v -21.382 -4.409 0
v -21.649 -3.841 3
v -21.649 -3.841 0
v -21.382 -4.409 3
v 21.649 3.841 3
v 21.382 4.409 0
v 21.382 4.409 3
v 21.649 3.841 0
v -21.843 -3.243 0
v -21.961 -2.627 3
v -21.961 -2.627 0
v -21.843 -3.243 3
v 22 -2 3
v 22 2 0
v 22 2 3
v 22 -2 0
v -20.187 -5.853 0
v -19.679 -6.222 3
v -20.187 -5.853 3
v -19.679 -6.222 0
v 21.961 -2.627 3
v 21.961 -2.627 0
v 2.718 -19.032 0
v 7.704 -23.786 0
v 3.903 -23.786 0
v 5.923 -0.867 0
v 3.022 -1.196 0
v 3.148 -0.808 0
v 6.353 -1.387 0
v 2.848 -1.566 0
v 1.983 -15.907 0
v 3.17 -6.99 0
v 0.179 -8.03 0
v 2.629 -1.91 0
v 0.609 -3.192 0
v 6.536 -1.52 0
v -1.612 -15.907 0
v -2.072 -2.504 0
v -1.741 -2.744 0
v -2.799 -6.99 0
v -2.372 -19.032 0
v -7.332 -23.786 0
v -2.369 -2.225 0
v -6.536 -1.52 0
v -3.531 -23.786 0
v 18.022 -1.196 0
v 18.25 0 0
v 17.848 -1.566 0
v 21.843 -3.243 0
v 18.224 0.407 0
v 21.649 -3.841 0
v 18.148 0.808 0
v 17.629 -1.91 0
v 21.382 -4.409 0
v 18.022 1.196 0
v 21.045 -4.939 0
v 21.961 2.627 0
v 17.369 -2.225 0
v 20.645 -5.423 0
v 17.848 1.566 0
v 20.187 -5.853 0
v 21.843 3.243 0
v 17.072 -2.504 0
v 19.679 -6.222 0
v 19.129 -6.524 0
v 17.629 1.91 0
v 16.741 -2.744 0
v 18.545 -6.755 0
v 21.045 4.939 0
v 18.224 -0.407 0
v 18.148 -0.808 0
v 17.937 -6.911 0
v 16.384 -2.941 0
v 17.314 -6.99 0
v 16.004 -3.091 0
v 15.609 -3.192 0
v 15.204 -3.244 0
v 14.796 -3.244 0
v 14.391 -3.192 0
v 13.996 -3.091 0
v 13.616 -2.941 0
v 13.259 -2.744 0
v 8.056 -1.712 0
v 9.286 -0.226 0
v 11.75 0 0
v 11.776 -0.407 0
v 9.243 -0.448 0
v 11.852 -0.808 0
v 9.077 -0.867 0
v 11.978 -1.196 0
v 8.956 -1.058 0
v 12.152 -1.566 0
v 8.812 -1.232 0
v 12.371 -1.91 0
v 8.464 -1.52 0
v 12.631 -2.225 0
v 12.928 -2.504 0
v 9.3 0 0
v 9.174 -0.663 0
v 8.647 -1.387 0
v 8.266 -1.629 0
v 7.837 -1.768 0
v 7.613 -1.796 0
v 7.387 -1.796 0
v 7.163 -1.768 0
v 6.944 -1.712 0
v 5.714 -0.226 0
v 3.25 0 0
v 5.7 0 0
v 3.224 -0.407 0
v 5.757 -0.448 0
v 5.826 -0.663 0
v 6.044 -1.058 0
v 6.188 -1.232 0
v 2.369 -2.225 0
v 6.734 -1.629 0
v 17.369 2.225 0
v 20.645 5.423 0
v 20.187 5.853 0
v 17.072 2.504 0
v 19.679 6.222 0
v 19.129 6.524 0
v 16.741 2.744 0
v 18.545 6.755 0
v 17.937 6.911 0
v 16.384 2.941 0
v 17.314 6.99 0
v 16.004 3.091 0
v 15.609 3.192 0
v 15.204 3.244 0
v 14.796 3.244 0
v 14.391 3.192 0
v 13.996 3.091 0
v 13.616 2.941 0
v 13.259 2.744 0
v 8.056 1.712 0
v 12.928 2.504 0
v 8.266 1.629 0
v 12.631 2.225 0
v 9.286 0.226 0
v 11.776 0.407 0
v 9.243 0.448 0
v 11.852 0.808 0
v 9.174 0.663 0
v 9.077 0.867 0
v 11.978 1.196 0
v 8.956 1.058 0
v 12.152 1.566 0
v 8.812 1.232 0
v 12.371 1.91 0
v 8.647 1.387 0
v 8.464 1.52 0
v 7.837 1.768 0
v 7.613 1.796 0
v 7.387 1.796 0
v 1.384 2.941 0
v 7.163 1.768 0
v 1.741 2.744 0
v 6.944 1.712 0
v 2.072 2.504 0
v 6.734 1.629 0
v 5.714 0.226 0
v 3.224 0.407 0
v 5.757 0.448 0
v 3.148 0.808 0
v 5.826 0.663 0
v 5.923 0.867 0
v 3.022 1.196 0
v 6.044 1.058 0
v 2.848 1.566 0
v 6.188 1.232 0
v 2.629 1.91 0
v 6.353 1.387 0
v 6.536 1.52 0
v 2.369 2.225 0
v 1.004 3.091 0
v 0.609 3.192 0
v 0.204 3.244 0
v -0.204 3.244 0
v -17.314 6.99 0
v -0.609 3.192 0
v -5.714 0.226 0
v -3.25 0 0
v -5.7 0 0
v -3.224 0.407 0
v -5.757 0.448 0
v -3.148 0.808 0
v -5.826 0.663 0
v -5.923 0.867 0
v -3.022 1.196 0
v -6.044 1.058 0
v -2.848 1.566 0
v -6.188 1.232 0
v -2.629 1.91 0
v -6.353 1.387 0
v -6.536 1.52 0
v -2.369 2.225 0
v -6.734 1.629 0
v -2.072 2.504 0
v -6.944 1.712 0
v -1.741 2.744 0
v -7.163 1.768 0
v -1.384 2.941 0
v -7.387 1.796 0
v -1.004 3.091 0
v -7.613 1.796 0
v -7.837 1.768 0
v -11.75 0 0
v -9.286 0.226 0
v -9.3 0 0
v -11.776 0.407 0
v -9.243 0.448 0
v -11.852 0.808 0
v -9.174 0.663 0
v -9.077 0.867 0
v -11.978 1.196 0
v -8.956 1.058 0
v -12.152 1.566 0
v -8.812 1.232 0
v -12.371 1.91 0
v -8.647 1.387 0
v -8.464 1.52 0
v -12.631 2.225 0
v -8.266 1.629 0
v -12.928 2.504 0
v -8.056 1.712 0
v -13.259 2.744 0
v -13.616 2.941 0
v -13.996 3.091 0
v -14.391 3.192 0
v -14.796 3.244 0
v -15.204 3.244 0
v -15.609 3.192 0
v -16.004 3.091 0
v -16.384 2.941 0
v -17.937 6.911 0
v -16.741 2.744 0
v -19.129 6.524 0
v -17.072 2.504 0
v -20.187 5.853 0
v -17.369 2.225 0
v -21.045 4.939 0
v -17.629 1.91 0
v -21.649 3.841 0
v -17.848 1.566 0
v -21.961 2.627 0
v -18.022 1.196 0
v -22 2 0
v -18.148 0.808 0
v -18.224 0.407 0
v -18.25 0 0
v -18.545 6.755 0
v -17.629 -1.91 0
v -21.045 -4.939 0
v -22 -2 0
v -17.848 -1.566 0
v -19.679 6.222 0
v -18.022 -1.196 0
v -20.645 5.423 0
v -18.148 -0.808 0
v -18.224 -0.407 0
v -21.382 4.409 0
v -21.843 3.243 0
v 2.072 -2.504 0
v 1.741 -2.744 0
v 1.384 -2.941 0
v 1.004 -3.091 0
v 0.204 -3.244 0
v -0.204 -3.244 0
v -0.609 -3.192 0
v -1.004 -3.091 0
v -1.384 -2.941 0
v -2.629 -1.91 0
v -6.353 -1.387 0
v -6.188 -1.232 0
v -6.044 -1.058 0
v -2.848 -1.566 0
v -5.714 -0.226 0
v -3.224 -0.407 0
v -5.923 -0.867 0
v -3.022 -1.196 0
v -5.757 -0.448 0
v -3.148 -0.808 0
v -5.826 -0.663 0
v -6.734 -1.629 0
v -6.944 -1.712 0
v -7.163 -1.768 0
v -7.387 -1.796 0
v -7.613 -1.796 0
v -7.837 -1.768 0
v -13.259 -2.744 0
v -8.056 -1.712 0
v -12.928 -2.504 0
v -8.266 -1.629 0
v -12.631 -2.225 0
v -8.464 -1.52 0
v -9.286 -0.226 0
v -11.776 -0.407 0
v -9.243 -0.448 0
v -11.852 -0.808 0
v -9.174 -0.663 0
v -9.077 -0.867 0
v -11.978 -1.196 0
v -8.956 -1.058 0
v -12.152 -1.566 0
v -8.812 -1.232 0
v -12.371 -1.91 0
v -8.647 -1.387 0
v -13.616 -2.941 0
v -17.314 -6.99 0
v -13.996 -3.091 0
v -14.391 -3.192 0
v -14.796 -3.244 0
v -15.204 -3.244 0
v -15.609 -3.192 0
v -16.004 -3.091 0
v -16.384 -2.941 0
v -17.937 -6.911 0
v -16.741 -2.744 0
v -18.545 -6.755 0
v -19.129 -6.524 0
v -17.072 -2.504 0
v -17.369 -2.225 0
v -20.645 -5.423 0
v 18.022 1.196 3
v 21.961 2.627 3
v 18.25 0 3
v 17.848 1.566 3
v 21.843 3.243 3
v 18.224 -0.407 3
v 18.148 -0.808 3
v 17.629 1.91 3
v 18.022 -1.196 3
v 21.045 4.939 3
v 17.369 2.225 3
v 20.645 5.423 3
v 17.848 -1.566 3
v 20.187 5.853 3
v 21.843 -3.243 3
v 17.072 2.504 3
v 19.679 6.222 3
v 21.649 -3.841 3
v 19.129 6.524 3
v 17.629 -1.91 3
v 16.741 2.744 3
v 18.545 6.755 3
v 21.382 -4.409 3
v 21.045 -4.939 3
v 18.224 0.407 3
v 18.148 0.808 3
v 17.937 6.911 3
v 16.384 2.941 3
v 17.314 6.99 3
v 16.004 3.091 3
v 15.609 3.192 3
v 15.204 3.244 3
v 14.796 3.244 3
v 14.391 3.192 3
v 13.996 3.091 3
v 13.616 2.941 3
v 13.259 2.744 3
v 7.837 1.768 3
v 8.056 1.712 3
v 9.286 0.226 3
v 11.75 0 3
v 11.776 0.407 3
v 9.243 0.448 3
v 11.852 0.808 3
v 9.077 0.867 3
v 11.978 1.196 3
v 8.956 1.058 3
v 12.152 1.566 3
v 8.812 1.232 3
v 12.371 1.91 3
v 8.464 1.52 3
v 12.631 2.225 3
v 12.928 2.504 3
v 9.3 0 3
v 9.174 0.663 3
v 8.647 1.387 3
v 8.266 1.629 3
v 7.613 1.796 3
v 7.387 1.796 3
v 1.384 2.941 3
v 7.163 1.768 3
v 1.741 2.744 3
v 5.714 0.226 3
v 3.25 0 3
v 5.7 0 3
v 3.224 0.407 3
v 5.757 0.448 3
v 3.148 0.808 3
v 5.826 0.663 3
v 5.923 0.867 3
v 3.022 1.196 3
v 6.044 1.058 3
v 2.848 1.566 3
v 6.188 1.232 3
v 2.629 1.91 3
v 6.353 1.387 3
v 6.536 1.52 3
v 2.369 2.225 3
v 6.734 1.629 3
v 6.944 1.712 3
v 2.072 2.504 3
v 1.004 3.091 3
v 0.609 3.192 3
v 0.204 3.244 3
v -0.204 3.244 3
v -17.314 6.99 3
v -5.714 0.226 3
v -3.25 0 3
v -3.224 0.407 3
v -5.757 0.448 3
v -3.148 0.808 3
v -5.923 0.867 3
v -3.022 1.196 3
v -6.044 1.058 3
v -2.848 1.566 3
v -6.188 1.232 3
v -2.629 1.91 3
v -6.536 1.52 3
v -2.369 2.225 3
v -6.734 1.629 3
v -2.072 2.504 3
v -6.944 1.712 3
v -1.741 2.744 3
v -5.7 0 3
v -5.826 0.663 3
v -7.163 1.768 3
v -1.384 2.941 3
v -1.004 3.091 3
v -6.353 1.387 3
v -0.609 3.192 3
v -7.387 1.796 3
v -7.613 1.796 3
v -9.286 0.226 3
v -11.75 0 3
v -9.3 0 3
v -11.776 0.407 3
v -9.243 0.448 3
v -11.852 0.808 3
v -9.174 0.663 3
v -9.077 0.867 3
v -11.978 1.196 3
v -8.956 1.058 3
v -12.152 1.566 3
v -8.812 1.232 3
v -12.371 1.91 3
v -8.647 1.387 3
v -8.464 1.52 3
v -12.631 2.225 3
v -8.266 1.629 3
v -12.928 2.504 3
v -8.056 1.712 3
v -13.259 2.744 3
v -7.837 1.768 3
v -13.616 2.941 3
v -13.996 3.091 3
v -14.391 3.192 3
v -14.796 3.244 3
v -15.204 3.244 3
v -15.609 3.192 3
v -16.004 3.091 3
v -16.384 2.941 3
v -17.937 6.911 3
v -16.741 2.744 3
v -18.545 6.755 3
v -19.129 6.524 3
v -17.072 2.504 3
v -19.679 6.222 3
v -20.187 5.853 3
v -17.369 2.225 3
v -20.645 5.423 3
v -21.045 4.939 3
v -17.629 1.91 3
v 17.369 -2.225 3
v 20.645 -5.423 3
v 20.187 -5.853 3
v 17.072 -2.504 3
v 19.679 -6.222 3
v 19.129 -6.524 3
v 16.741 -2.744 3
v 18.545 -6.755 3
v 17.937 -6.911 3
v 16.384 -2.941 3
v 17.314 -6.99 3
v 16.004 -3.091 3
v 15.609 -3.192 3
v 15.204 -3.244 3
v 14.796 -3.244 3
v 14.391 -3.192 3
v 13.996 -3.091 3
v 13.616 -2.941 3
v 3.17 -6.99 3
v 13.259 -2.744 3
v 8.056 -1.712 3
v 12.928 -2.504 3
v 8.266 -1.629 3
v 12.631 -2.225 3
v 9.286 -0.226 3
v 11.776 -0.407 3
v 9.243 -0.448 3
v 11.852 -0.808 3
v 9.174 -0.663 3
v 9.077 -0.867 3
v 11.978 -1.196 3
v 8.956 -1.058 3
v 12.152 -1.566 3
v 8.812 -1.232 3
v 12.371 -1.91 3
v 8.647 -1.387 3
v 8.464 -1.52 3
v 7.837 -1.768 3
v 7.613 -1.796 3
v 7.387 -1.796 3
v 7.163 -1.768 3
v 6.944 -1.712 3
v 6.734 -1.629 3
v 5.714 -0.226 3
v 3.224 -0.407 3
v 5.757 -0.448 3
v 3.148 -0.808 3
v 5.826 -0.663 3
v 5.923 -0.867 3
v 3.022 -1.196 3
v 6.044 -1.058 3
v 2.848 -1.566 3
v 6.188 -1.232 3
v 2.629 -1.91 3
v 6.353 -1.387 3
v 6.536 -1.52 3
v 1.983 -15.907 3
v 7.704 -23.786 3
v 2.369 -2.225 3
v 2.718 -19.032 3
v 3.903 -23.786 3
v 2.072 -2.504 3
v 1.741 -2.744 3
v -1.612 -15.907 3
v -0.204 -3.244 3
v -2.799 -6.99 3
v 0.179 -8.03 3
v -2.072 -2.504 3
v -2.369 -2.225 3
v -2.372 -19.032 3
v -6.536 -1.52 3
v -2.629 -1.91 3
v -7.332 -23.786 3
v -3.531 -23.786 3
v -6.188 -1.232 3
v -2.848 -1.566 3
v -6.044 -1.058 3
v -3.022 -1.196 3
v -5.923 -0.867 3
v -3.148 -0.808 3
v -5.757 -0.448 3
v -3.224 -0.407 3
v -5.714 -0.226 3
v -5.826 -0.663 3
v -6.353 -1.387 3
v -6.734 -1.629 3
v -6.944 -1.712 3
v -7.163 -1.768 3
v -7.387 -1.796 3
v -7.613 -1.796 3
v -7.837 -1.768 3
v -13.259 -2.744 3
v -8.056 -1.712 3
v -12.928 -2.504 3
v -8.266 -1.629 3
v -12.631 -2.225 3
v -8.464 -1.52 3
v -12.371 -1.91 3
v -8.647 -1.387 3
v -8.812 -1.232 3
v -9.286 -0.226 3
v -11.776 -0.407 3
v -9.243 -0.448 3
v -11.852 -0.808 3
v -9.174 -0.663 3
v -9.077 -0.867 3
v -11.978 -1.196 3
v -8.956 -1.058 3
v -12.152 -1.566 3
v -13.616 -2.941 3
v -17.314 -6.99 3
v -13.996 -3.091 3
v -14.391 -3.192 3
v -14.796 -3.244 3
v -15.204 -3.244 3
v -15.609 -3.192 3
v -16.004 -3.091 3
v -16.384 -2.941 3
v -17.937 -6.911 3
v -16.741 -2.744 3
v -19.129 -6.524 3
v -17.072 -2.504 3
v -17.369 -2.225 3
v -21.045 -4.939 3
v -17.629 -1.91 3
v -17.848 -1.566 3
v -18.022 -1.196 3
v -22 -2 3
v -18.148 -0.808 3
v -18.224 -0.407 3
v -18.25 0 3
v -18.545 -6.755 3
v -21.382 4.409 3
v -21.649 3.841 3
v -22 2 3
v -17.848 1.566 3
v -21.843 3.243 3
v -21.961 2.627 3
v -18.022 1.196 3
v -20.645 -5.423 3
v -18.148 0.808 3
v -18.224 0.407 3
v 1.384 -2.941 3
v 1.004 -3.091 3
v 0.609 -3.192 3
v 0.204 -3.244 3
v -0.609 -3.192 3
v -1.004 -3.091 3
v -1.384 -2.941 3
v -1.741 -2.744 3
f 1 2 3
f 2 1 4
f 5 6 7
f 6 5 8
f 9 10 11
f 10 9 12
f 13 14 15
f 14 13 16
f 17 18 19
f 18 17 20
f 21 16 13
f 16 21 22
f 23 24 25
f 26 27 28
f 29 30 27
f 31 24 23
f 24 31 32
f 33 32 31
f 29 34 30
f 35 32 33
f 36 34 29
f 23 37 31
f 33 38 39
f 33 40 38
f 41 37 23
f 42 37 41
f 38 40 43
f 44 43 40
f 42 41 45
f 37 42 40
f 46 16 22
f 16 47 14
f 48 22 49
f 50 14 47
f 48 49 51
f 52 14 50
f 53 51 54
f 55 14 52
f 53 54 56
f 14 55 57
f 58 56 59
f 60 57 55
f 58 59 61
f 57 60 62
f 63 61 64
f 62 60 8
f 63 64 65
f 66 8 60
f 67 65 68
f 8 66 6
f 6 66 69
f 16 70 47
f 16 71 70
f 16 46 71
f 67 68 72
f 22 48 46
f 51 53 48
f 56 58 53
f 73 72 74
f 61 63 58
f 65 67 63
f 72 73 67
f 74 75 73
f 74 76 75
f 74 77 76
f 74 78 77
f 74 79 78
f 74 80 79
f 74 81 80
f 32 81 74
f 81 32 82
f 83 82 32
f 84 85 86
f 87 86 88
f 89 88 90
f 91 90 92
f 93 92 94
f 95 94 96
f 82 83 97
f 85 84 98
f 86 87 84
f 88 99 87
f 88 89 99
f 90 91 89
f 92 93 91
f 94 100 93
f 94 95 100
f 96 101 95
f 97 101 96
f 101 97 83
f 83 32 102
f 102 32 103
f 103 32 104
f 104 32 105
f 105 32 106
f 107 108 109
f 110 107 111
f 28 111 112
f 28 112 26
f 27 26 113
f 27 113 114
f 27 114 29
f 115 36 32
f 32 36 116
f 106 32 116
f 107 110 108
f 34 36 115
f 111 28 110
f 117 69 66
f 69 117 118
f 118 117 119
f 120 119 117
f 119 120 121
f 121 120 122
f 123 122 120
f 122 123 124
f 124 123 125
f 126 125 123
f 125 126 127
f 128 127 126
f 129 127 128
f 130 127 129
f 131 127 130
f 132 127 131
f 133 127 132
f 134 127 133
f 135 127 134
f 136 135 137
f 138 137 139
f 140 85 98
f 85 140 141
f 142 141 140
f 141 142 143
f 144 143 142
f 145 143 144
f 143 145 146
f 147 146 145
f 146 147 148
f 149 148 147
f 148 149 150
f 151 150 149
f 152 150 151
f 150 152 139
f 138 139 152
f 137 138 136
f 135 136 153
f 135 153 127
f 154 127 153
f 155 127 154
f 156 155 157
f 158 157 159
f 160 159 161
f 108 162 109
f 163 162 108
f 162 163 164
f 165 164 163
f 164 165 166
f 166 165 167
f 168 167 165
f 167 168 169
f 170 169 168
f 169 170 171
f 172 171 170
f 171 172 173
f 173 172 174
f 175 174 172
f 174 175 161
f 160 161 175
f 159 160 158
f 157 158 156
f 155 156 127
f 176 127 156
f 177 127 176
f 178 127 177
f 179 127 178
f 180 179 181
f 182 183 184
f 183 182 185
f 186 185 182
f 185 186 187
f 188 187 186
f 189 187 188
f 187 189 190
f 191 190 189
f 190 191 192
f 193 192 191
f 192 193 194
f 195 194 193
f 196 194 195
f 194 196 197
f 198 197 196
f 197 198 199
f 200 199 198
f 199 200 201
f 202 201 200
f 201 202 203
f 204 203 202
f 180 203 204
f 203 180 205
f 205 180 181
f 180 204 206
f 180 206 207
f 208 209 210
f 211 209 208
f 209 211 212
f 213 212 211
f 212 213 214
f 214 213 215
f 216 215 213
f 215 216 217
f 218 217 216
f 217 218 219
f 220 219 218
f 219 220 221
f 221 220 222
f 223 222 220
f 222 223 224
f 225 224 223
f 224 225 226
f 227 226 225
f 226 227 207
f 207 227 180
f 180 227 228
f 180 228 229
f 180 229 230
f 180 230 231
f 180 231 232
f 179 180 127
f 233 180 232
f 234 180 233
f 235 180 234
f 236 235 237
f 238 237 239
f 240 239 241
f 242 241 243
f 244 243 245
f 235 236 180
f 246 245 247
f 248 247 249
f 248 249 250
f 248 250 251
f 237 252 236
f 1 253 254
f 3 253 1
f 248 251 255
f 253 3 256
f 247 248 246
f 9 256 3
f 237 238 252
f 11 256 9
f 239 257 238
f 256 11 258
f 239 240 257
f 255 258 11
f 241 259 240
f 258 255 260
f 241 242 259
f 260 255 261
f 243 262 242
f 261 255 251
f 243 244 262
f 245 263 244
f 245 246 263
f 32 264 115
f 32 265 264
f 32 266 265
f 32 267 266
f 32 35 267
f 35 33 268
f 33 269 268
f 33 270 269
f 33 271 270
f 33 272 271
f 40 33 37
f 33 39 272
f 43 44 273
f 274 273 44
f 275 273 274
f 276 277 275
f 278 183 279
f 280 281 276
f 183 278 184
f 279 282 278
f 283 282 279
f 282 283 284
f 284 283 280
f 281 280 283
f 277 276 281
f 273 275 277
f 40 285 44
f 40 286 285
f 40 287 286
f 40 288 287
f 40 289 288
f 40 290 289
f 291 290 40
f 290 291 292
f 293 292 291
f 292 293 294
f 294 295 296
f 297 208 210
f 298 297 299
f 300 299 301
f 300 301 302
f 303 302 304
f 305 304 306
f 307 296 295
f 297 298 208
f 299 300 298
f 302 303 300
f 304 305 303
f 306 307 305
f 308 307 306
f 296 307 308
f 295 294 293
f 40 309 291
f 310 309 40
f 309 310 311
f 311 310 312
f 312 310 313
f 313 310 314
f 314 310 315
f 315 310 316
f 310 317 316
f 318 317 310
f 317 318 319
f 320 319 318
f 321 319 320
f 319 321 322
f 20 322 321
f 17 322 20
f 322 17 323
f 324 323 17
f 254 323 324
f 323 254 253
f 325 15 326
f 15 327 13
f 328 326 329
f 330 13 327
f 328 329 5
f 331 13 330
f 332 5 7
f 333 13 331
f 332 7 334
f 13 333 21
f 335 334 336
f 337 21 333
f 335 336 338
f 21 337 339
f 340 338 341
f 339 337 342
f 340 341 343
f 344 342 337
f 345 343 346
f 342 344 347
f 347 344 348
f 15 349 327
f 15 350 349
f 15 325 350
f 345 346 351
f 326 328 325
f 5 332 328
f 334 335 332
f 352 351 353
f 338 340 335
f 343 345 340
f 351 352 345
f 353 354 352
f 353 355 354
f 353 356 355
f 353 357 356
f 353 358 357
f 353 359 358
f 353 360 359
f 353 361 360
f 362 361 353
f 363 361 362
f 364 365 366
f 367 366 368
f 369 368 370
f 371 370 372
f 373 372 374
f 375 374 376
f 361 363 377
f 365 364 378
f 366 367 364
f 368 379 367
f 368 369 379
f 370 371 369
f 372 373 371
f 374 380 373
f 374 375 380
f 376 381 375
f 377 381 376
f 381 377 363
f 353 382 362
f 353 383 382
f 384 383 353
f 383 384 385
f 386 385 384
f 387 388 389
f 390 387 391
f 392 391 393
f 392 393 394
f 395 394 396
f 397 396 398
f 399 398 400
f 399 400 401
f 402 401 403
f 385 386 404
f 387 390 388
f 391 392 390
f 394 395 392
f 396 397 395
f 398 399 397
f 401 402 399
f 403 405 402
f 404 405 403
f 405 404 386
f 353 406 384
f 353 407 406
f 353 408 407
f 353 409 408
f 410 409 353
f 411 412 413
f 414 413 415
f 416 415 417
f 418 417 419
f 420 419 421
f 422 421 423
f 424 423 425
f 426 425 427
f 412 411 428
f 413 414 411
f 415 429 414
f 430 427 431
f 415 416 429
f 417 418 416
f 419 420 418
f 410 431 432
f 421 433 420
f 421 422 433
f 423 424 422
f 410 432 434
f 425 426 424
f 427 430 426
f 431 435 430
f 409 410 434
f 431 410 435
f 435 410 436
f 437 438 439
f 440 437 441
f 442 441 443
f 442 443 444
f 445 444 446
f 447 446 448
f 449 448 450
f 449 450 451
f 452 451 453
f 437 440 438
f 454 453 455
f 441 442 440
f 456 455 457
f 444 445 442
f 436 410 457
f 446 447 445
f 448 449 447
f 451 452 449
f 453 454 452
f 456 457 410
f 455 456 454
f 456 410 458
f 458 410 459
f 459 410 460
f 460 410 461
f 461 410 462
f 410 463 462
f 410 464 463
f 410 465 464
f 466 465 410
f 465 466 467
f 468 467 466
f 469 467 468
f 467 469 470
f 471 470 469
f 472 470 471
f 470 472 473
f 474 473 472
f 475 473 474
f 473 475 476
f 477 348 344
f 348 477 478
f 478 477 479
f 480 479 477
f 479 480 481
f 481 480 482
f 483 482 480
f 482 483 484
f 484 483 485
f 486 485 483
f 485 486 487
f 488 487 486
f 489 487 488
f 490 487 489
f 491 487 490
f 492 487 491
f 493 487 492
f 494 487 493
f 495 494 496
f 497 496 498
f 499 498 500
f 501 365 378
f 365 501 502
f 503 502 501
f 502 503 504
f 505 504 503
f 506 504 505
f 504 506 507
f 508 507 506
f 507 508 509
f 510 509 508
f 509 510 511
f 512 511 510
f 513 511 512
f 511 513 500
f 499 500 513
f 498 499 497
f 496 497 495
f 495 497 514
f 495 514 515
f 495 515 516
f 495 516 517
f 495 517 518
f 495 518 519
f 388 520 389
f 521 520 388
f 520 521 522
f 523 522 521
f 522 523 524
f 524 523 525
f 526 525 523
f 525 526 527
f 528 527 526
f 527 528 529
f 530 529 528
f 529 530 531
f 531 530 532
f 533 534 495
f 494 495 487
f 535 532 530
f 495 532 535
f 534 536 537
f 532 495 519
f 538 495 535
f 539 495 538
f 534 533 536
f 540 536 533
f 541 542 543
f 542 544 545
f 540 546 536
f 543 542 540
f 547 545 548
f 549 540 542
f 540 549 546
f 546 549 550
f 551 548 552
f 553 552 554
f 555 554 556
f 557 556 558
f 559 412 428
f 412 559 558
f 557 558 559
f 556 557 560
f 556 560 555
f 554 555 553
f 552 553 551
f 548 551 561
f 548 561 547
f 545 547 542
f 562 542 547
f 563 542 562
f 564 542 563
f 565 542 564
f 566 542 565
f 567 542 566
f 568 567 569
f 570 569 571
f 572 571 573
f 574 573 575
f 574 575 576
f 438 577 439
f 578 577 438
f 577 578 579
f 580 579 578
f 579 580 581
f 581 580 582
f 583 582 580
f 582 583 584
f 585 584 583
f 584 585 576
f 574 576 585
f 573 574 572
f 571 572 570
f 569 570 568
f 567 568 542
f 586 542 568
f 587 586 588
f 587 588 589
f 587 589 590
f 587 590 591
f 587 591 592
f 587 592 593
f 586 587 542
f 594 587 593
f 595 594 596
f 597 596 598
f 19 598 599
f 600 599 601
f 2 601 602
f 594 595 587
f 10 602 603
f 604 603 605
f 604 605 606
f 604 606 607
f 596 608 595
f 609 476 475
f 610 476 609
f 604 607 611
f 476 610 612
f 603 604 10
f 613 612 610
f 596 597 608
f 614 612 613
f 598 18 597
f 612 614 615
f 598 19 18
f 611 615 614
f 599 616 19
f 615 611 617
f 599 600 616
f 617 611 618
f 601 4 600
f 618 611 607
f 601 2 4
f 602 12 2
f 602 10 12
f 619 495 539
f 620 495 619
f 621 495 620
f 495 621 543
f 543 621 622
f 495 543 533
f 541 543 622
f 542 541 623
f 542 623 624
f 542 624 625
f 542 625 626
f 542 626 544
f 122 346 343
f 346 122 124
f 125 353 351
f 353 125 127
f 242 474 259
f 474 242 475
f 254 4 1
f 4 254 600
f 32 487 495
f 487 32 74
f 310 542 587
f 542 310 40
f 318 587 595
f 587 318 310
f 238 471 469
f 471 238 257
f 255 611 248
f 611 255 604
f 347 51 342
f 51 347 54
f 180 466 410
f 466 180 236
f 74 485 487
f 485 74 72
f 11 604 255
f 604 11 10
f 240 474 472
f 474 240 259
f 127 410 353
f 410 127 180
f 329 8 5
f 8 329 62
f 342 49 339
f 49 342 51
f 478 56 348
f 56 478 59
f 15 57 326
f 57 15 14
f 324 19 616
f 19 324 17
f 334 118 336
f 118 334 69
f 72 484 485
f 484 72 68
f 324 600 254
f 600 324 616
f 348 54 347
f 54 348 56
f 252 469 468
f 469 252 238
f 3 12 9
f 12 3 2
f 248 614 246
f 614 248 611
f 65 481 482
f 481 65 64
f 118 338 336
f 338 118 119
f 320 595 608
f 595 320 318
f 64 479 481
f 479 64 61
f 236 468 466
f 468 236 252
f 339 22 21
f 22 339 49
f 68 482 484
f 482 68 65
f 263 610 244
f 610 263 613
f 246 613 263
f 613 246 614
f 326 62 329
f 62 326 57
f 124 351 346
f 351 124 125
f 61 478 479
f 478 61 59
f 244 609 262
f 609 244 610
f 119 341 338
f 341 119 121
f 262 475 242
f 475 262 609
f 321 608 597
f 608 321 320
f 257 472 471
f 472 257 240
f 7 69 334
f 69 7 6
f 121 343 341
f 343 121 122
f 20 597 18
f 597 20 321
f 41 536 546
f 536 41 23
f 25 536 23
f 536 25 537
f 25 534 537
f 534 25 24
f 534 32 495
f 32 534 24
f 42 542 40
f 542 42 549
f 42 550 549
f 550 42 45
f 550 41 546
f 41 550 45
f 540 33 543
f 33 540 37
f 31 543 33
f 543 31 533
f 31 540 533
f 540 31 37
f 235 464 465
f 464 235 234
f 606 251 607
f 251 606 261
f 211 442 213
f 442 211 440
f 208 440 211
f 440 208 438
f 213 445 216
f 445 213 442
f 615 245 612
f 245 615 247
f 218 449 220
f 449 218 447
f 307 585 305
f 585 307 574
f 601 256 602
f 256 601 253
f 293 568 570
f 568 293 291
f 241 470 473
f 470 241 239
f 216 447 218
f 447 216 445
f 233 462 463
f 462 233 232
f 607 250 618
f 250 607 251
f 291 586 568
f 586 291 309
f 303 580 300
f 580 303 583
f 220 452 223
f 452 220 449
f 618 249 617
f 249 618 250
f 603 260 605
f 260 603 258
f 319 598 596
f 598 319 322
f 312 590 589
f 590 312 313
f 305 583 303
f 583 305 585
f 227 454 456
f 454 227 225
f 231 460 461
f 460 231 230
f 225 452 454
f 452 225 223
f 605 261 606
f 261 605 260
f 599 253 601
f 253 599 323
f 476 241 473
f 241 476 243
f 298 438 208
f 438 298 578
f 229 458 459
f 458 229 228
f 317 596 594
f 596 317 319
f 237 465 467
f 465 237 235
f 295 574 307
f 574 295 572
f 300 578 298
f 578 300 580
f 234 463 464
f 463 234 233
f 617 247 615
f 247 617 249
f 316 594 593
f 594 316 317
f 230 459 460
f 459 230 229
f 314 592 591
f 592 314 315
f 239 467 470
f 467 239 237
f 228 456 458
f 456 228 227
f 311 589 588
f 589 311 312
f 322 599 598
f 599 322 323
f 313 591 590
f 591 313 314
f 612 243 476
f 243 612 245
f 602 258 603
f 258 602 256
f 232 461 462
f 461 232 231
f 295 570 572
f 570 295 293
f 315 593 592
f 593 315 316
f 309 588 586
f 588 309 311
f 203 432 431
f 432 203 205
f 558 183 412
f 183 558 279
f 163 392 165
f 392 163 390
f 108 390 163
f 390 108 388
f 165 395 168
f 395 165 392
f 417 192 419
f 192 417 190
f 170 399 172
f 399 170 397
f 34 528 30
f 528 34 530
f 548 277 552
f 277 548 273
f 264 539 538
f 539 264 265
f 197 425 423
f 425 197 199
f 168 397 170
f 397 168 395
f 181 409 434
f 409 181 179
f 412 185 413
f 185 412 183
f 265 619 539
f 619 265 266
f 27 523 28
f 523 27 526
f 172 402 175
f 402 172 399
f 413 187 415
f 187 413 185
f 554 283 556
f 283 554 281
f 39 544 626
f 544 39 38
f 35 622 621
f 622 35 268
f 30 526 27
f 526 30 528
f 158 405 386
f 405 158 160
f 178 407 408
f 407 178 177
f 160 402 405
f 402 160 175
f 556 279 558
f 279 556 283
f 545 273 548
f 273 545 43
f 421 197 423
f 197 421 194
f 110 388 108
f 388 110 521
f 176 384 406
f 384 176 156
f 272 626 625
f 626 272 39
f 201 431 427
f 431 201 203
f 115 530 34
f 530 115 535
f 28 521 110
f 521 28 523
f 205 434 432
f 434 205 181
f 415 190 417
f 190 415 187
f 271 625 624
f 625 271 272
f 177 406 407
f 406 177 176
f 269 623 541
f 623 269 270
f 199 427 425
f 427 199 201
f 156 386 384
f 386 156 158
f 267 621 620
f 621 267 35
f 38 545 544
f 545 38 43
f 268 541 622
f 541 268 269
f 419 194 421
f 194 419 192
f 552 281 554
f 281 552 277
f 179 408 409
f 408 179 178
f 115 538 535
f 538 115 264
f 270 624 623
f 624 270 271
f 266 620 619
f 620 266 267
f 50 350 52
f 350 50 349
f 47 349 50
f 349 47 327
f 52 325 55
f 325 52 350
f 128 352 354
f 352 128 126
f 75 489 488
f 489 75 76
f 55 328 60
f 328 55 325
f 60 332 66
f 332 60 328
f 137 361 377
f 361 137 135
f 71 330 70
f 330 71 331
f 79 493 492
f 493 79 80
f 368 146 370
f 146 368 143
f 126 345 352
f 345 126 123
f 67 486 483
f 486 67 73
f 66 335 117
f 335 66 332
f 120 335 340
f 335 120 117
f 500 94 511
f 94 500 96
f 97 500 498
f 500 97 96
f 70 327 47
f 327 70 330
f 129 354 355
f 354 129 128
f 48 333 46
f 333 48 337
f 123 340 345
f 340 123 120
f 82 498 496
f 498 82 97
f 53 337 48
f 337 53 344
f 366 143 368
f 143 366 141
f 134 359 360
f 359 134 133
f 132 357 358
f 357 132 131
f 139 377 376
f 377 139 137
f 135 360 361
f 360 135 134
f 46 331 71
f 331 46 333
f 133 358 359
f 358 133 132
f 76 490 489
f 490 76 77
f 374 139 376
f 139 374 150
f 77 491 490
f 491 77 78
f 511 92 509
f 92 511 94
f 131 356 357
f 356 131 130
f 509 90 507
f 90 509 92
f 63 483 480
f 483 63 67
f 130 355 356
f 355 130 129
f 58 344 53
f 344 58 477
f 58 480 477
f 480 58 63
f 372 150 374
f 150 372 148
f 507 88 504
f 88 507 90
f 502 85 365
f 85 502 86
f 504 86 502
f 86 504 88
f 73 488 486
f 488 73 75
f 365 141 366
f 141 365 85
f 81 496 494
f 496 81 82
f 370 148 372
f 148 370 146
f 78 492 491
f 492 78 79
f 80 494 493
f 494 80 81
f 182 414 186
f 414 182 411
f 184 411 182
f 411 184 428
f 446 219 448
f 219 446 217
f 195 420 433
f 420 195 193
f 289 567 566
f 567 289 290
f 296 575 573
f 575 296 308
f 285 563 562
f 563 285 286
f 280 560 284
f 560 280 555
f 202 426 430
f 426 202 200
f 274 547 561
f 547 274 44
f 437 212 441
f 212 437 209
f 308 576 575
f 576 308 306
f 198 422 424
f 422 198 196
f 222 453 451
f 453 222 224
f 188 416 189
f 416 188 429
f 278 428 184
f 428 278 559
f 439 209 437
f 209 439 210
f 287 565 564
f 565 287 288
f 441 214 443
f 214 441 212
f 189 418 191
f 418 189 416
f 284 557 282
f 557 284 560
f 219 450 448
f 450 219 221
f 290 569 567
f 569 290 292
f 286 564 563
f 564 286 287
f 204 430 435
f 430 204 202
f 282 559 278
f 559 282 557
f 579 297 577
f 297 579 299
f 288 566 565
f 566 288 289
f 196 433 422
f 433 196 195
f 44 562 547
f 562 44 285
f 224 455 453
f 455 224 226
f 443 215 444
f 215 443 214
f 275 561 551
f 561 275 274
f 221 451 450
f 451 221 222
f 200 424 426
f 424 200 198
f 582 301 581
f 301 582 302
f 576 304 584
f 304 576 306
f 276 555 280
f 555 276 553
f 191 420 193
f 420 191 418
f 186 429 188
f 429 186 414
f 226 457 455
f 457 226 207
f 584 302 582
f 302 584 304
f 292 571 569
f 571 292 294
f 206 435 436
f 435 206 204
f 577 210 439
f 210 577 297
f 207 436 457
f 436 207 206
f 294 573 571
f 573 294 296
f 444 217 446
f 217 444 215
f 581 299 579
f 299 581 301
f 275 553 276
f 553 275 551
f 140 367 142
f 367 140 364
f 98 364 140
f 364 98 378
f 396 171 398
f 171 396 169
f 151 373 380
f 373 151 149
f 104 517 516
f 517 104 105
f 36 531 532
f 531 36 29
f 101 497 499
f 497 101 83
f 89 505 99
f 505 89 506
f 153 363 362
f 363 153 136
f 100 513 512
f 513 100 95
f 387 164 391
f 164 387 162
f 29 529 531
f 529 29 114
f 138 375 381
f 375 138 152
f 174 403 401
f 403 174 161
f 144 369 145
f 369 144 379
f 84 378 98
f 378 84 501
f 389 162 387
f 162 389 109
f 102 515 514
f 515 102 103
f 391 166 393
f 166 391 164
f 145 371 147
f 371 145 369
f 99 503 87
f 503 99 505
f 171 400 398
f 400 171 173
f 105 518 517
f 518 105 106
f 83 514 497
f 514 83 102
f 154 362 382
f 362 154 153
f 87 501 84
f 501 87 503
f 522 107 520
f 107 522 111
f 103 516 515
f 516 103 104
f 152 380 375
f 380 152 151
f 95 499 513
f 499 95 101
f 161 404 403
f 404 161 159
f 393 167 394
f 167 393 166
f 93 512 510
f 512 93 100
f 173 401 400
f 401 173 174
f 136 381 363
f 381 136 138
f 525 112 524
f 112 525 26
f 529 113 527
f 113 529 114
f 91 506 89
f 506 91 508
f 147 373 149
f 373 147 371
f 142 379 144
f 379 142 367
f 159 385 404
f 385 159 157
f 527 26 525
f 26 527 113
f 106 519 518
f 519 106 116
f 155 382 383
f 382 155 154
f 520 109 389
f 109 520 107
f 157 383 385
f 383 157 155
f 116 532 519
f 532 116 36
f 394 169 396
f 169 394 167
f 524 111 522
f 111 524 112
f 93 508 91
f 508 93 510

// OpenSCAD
$fn = 50;


difference() {
	union() {
		hull() {
			translate(v = [-17.0000000000, 2.0000000000, 0]) {
				cylinder(h = 3, r = 5);
			}
			translate(v = [17.0000000000, 2.0000000000, 0]) {
				cylinder(h = 3, r = 5);
			}
			translate(v = [-17.0000000000, -2.0000000000, 0]) {
				cylinder(h = 3, r = 5);
			}
			translate(v = [17.0000000000, -2.0000000000, 0]) {
				cylinder(h = 3, r = 5);
			}
		}
		translate(v = [0, -5, 0]) {
			linear_extrude(height = 3) {
				text(font = "DejaVu Sans Mono:style=Bold", halign = "center", size = 19.0000000000, text = "A", valign = "top");
			}
		}
	}
	union() {
		translate(v = [-15.0000000000, 0.0000000000, 0]) {
			translate(v = [0, 0, -100]) {
				cylinder(h = 200, r = 3.2500000000);
			}
		}
		translate(v = [0, 0, -100]) {
			cylinder(h = 200, r = 3.2500000000);
		}
		translate(v = [15.0000000000, 0.0000000000, 0]) {
			translate(v = [0, 0, -100]) {
				cylinder(h = 200, r = 3.2500000000);
			}
		}
		translate(v = [-15.0000000000, 0.0000000000, 0]) {
			translate(v = [0, 0, -100]) {
				cylinder(h = 200, r = 1.8000000000);
			}
		}
		translate(v = [-7.5000000000, 0.0000000000, 0]) {
			translate(v = [0, 0, -100]) {
				cylinder(h = 200, r = 1.8000000000);
			}
		}
		translate(v = [0, 0, -100]) {
			cylinder(h = 200, r = 1.8000000000);
		}
		translate(v = [7.5000000000, 0.0000000000, 0]) {
			translate(v = [0, 0, -100]) {
				cylinder(h = 200, r = 1.8000000000);
			}
		}
		translate(v = [15.0000000000, 0.0000000000, 0]) {
			translate(v = [0, 0, -100]) {
				cylinder(h = 200, r = 1.8000000000);
			}
		}
	}
}
